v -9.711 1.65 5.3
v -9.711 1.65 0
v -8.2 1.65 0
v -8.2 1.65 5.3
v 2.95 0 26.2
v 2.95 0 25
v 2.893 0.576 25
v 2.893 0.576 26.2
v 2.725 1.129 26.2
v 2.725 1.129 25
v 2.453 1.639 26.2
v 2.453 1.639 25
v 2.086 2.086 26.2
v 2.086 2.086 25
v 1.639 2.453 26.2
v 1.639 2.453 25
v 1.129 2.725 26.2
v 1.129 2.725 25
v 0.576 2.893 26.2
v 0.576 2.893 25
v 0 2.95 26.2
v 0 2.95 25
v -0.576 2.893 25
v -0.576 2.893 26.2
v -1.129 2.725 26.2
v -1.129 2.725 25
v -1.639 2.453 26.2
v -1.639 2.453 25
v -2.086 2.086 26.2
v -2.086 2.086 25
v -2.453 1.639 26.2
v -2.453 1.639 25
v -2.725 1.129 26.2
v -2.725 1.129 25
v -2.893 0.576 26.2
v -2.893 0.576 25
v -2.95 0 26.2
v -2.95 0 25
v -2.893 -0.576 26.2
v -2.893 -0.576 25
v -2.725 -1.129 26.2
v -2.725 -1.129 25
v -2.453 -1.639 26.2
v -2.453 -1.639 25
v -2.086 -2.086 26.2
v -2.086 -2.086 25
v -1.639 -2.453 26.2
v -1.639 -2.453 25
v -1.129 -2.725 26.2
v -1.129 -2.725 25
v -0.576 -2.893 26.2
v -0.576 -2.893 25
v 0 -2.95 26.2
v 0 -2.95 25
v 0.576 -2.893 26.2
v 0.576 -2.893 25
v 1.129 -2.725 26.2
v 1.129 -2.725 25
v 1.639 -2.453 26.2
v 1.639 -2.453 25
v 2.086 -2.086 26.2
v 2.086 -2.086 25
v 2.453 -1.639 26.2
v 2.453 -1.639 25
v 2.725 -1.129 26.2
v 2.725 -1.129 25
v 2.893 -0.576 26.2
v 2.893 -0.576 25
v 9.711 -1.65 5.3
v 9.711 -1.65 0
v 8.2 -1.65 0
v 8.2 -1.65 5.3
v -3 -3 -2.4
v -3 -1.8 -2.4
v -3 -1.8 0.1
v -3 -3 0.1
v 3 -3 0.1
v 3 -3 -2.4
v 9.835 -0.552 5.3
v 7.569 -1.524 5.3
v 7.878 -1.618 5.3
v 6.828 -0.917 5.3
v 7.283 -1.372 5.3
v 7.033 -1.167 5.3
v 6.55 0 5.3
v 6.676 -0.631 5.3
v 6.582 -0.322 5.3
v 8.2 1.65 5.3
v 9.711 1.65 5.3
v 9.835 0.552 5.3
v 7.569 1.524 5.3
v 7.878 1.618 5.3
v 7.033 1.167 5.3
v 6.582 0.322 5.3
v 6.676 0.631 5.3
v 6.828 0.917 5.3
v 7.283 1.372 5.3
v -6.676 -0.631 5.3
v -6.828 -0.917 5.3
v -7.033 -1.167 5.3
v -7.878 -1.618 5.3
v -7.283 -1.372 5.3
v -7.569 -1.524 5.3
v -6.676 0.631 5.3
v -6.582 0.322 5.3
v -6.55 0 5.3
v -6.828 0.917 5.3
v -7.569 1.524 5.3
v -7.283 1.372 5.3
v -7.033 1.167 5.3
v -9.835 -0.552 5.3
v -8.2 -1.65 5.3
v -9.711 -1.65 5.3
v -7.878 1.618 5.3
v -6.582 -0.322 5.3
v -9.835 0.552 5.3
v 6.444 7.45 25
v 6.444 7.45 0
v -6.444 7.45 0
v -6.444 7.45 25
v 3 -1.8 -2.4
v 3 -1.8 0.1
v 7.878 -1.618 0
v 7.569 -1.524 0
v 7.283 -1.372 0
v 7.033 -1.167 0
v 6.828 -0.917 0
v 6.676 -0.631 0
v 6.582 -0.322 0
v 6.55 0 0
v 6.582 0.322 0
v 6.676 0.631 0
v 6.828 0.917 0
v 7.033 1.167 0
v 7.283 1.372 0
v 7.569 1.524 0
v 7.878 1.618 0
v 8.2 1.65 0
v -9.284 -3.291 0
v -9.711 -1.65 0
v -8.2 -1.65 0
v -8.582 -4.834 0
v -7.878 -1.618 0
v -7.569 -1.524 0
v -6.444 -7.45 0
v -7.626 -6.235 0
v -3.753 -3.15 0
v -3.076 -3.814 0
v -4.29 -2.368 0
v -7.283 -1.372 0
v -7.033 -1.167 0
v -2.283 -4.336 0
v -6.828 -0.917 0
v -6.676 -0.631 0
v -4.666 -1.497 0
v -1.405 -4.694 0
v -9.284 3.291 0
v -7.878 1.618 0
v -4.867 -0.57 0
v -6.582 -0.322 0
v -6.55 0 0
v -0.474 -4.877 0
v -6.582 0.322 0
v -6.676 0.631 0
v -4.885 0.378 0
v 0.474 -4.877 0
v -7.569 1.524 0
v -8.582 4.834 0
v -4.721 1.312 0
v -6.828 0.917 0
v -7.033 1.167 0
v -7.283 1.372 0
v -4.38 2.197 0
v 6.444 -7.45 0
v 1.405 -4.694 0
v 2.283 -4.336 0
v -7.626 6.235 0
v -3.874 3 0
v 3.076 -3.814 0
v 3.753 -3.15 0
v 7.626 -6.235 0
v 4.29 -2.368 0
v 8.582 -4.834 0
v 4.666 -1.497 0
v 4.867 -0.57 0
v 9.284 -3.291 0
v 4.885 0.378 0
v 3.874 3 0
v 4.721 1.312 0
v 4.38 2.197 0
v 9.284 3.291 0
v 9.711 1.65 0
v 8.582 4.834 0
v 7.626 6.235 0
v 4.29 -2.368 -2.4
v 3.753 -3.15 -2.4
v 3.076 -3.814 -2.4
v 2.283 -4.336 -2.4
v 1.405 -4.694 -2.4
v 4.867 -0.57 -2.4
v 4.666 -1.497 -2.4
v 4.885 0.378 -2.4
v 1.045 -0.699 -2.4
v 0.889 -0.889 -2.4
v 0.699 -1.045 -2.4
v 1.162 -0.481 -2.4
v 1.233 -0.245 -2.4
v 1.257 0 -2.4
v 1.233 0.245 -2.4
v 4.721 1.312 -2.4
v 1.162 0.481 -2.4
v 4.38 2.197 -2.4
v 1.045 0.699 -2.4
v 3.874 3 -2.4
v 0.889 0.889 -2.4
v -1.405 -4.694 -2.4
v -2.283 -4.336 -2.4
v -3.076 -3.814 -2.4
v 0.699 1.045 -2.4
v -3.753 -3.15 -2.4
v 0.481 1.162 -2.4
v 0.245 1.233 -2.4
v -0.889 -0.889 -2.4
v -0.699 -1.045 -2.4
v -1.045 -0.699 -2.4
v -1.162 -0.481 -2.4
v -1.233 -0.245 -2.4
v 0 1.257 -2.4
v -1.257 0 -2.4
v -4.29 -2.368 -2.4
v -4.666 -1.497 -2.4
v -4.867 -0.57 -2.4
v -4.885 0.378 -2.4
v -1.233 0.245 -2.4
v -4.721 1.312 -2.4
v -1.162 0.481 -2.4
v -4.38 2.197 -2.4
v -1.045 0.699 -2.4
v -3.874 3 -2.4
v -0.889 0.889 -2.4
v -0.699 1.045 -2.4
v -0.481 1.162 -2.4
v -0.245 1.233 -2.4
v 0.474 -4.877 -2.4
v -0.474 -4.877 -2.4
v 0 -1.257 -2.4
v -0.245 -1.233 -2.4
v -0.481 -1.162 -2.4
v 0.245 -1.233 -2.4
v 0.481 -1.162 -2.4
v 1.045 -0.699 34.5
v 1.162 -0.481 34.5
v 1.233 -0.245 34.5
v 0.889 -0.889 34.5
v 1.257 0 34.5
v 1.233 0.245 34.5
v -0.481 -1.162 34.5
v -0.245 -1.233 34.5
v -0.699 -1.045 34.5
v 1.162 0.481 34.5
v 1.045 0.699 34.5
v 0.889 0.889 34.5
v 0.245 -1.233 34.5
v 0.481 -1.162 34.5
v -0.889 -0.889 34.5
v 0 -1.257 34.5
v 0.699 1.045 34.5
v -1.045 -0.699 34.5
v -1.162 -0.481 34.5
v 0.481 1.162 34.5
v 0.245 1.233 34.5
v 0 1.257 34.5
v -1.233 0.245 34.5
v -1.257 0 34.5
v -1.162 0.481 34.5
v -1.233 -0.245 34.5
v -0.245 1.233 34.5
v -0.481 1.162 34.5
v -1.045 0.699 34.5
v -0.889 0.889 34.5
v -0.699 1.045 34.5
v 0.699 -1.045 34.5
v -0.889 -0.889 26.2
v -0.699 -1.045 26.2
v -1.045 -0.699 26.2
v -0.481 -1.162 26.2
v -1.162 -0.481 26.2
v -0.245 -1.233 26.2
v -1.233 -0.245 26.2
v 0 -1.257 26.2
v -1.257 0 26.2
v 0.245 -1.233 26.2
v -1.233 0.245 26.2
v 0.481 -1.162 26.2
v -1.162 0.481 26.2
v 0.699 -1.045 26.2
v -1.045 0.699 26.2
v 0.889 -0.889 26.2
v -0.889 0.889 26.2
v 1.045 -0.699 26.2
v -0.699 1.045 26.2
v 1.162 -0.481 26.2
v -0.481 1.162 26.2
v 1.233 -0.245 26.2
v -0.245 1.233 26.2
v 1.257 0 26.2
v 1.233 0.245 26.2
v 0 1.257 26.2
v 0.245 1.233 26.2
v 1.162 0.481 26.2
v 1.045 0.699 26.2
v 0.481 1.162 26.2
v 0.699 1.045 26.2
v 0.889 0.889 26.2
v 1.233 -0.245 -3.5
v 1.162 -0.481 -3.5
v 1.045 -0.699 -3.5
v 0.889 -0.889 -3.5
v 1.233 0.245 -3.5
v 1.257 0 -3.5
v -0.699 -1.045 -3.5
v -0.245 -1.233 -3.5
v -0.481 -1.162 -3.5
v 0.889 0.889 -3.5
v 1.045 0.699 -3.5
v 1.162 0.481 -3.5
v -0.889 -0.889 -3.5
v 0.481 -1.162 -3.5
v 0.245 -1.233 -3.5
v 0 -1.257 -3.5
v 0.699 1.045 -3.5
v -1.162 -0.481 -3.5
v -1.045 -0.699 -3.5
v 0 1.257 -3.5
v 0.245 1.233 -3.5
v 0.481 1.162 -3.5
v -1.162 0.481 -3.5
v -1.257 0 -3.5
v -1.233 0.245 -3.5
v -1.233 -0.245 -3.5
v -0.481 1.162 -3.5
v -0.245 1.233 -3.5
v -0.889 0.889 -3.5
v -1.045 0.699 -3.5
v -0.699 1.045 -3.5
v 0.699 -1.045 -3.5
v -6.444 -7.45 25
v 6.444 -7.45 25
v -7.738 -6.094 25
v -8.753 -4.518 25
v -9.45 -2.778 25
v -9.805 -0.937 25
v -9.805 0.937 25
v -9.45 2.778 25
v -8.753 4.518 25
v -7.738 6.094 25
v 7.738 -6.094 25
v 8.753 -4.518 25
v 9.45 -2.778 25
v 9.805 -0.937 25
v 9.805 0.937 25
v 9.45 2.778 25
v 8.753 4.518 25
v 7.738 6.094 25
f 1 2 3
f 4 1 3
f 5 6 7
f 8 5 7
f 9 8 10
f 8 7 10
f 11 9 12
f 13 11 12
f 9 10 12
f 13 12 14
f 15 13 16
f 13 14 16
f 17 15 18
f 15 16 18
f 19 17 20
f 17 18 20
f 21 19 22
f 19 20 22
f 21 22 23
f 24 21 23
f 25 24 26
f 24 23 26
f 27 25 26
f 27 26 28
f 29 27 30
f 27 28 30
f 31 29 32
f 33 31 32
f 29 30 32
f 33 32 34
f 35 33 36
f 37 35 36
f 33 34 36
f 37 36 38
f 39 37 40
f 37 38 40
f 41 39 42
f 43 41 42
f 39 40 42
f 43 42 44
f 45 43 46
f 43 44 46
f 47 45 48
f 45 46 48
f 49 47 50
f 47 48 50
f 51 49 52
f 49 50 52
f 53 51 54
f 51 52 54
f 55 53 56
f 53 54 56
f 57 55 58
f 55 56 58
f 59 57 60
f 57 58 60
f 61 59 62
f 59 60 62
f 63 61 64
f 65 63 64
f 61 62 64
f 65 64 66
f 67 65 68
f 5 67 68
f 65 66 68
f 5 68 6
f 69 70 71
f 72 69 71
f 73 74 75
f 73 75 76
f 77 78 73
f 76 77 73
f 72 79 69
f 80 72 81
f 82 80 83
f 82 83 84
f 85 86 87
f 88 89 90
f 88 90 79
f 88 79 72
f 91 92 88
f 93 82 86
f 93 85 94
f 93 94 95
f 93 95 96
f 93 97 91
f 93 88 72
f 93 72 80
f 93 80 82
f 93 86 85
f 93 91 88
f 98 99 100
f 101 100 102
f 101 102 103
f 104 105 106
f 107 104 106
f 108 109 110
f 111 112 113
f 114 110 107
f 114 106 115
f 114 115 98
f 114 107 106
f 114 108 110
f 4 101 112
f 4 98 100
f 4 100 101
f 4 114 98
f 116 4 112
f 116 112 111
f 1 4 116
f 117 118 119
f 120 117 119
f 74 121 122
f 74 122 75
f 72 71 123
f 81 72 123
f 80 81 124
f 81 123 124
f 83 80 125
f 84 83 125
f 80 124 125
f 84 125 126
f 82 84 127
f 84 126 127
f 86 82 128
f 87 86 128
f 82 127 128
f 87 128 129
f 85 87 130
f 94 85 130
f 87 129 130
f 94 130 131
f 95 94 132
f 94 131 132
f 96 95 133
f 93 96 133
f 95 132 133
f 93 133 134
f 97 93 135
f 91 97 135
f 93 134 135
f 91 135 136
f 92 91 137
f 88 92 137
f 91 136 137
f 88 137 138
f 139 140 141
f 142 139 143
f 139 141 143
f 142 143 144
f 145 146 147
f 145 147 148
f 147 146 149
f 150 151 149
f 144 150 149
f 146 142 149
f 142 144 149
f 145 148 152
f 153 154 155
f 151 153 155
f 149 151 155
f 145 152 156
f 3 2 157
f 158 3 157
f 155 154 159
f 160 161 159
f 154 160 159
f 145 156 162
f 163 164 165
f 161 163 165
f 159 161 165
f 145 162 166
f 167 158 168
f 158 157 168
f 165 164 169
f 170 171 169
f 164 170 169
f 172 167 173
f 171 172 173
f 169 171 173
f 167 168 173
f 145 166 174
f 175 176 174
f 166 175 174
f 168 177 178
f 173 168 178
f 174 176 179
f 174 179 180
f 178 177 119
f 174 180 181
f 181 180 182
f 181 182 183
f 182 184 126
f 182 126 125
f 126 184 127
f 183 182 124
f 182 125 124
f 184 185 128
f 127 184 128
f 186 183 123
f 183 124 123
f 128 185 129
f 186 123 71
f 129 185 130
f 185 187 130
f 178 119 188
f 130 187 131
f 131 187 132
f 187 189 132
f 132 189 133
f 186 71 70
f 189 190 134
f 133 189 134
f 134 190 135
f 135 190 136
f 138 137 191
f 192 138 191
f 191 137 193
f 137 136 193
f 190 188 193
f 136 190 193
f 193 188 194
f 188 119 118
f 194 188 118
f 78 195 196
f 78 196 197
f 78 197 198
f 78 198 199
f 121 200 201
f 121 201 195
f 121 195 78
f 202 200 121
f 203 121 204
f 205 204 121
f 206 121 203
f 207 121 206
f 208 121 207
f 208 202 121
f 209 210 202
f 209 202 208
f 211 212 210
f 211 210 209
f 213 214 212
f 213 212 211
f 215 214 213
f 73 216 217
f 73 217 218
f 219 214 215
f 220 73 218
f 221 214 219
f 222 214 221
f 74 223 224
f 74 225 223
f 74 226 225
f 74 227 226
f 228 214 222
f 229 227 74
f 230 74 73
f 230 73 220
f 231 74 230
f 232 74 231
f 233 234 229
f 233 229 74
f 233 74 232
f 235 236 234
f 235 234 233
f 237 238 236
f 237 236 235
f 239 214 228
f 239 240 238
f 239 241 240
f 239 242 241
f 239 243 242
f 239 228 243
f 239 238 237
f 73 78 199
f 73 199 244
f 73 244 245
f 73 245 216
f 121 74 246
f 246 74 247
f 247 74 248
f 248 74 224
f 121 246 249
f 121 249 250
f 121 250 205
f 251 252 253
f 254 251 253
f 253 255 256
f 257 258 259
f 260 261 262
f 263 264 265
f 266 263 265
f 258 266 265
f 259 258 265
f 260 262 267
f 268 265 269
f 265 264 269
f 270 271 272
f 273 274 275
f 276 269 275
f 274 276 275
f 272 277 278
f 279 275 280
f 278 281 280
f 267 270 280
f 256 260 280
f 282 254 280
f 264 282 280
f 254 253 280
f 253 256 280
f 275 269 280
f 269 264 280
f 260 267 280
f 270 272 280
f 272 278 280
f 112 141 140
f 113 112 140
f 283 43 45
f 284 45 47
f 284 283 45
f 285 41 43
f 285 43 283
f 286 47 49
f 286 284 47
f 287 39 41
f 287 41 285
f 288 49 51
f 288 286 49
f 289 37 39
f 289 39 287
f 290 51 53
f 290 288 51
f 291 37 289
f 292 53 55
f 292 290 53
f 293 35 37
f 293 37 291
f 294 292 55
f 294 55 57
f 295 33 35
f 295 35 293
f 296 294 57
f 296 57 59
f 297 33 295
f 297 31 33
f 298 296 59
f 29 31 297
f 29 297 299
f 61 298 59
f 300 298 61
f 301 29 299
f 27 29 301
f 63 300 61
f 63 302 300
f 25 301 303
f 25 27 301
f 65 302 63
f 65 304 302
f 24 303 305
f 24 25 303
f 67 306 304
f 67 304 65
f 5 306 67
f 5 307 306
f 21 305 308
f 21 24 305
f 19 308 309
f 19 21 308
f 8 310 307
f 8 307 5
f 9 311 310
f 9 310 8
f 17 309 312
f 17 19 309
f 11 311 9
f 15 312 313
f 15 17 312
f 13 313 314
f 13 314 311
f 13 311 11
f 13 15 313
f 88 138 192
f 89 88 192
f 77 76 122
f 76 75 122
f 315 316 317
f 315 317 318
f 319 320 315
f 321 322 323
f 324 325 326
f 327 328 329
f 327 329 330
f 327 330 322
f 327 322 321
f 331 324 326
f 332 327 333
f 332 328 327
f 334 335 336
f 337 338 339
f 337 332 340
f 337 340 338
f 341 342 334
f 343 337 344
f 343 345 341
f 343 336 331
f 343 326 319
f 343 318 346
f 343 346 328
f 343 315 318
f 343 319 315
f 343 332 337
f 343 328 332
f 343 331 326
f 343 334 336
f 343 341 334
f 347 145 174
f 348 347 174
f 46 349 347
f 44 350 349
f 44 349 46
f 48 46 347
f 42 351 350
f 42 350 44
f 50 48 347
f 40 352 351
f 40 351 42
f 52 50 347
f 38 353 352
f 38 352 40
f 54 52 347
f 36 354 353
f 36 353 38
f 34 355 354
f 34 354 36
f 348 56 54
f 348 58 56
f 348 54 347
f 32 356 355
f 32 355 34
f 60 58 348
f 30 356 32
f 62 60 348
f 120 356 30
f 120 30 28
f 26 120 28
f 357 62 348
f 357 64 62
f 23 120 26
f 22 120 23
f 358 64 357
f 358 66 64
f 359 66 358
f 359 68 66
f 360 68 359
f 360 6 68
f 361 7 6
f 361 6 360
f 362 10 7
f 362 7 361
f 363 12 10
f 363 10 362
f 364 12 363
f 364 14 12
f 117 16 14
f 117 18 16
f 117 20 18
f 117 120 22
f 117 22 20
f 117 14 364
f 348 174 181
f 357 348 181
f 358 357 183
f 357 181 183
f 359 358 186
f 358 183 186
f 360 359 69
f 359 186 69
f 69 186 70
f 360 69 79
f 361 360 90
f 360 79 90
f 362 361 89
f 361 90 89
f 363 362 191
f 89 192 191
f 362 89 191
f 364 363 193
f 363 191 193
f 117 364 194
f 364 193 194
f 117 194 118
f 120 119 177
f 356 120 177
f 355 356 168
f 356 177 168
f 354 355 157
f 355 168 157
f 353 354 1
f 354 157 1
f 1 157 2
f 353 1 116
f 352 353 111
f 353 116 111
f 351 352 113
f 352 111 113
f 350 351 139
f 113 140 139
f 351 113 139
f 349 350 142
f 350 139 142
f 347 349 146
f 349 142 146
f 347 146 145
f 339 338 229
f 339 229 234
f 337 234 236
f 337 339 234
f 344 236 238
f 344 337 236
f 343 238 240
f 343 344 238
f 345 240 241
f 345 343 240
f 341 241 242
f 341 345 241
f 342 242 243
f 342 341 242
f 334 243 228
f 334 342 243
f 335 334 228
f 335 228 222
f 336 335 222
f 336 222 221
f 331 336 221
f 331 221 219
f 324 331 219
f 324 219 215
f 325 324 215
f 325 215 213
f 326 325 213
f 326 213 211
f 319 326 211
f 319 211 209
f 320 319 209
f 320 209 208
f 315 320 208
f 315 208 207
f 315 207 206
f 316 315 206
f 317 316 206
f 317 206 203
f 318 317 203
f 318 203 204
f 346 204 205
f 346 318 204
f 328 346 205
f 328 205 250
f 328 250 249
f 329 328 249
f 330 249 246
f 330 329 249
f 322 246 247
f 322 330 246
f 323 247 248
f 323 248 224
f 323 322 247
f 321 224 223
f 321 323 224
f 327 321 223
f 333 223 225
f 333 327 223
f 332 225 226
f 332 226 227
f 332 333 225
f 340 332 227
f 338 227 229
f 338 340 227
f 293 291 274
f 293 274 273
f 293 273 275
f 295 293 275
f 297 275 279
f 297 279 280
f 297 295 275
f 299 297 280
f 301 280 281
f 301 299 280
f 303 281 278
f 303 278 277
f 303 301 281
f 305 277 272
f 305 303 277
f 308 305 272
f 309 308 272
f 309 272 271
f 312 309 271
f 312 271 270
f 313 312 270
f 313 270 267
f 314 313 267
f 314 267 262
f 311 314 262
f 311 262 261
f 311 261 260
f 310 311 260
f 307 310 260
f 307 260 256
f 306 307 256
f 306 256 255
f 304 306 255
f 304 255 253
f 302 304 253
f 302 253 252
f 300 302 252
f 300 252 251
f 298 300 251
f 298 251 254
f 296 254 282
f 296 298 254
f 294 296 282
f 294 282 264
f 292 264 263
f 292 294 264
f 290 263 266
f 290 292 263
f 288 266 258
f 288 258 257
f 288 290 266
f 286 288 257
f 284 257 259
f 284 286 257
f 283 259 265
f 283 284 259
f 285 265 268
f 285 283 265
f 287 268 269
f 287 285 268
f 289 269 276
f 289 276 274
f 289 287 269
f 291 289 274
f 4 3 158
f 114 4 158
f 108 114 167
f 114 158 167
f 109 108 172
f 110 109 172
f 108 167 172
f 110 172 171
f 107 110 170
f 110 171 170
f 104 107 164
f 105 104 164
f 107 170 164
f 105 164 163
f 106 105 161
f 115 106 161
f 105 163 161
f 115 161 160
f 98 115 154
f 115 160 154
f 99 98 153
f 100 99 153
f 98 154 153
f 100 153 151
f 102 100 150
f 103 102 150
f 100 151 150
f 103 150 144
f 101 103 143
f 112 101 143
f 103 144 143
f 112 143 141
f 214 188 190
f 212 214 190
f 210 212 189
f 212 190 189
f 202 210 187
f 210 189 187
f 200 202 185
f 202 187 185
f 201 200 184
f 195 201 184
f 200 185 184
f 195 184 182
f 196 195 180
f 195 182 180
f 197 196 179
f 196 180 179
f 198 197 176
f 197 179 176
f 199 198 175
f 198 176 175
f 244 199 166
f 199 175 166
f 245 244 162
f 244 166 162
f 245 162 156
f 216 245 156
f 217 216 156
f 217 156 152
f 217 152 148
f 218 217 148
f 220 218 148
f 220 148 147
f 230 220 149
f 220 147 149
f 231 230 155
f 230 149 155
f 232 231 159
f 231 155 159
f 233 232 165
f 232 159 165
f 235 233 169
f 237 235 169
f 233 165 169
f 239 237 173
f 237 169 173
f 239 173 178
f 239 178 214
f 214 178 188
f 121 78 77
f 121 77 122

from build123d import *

# Parameters (mm, degrees)
SALIENTE_EXTRUIR1_DEPTH = 25
CROQUIS2_R              = 2.95
SALIENTE_EXTRUIR2_DEPTH = 1.2
CORTAR_EXTRUIR1_DEPTH   = 5.3
SALIENTE_EXTRUIR3_DEPTH = 2.4
CORTAR_EXTRUIR2_DEPTH   = 2.5
CROQUIS6_R              = 1.256804149
SALIENTE_EXTRUIR4_DEPTH = 1.1
CROQUIS7_R              = 1.257398905
SALIENTE_EXTRUIR5_DEPTH = 38


with BuildPart() as part:
    # Croquis1 → Saliente-Extruir1 (new body)
    with BuildSketch(Plane.XY):
        with BuildLine():
            Line((6.443601477, 7.45), (0, 7.45))
            Line((0, 7.45), (-6.443601477, 7.45))
            ThreePointArc((-6.443601477, 7.45), (-9.85, 0), (-6.443601477, -7.45))
            Line((-6.443601477, -7.45), (0, -7.45))
            Line((0, -7.45), (6.443601477, -7.45))
            ThreePointArc((6.443601477, -7.45), (9.85, 0), (6.443601477, 7.45))
        make_face()
    extrude(amount=SALIENTE_EXTRUIR1_DEPTH)

    # Croquis2 → Saliente-Extruir2 (add)
    with BuildSketch(Plane.XY.offset(25)):
        Circle(CROQUIS2_R)
    extrude(amount=SALIENTE_EXTRUIR2_DEPTH)

    # Croquis3 → Cortar-Extruir1 (cut)
    with BuildSketch(Plane(origin=(0, 0, 0), x_dir=(-1, 0, 0), z_dir=(0, 0, -1))):
        with BuildLine():
            Line((-8.2, 1.65), (-9.710818709, 1.65))
            ThreePointArc((-9.710818709, 1.65), (-9.85, 0), (-9.710818709, -1.65))
            Line((-9.710818709, -1.65), (-8.2, -1.65))
            ThreePointArc((-8.2, -1.65), (-6.55, 0), (-8.2, 1.65))
        make_face()
        with BuildLine():
            Line((9.710818709, 1.65), (8.2, 1.65))
            ThreePointArc((8.2, 1.65), (6.55, 0), (8.2, -1.65))
            Line((8.2, -1.65), (9.710818709, -1.65))
            ThreePointArc((9.710818709, -1.65), (9.85, 0), (9.710818709, 1.65))
        make_face()
    extrude(amount=-CORTAR_EXTRUIR1_DEPTH, mode=Mode.SUBTRACT)

    # Croquis4 → Saliente-Extruir3 (add)
    with BuildSketch(Plane(origin=(0, 0, 0), x_dir=(-1, 0, 0), z_dir=(0, 0, -1))):
        with BuildLine():
            Line((3.874274126, 3), (0, 3))
            Line((0, 3), (-3.874274126, 3))
            ThreePointArc((-3.874274126, 3), (0, -4.9), (3.874274126, 3))
        make_face()
    extrude(amount=SALIENTE_EXTRUIR3_DEPTH)

    # Croquis5 → Cortar-Extruir2 (cut)
    with BuildSketch(Plane(origin=(0, 0, -2.4), x_dir=(-1, 0, 0), z_dir=(0, 0, -1))):
        Polygon((0, -3), (-3, -3), (-3, -1.8), (3, -1.8), (3, -3), align=None)
    extrude(amount=-CORTAR_EXTRUIR2_DEPTH, mode=Mode.SUBTRACT)



with BuildPart() as body_2:
    # Croquis6 → Saliente-Extruir4 (new body)
    with BuildSketch(Plane(origin=(0, 0, -2.4), x_dir=(-1, 0, 0), z_dir=(0, 0, -1))):
        Circle(CROQUIS6_R)
    extrude(amount=SALIENTE_EXTRUIR4_DEPTH)


with BuildPart() as part_1:
    add(part.part)

    add(body_2.part)  # Saliente-Extruir5 merges body 2
    # Croquis7 → Saliente-Extruir5 (add)
    with BuildSketch(Plane(origin=(0, 0, -3.5), x_dir=(-1, 0, 0), z_dir=(0, 0, -1))):
        Circle(CROQUIS7_R)
    extrude(amount=-SALIENTE_EXTRUIR5_DEPTH)


solid = part_1.part
